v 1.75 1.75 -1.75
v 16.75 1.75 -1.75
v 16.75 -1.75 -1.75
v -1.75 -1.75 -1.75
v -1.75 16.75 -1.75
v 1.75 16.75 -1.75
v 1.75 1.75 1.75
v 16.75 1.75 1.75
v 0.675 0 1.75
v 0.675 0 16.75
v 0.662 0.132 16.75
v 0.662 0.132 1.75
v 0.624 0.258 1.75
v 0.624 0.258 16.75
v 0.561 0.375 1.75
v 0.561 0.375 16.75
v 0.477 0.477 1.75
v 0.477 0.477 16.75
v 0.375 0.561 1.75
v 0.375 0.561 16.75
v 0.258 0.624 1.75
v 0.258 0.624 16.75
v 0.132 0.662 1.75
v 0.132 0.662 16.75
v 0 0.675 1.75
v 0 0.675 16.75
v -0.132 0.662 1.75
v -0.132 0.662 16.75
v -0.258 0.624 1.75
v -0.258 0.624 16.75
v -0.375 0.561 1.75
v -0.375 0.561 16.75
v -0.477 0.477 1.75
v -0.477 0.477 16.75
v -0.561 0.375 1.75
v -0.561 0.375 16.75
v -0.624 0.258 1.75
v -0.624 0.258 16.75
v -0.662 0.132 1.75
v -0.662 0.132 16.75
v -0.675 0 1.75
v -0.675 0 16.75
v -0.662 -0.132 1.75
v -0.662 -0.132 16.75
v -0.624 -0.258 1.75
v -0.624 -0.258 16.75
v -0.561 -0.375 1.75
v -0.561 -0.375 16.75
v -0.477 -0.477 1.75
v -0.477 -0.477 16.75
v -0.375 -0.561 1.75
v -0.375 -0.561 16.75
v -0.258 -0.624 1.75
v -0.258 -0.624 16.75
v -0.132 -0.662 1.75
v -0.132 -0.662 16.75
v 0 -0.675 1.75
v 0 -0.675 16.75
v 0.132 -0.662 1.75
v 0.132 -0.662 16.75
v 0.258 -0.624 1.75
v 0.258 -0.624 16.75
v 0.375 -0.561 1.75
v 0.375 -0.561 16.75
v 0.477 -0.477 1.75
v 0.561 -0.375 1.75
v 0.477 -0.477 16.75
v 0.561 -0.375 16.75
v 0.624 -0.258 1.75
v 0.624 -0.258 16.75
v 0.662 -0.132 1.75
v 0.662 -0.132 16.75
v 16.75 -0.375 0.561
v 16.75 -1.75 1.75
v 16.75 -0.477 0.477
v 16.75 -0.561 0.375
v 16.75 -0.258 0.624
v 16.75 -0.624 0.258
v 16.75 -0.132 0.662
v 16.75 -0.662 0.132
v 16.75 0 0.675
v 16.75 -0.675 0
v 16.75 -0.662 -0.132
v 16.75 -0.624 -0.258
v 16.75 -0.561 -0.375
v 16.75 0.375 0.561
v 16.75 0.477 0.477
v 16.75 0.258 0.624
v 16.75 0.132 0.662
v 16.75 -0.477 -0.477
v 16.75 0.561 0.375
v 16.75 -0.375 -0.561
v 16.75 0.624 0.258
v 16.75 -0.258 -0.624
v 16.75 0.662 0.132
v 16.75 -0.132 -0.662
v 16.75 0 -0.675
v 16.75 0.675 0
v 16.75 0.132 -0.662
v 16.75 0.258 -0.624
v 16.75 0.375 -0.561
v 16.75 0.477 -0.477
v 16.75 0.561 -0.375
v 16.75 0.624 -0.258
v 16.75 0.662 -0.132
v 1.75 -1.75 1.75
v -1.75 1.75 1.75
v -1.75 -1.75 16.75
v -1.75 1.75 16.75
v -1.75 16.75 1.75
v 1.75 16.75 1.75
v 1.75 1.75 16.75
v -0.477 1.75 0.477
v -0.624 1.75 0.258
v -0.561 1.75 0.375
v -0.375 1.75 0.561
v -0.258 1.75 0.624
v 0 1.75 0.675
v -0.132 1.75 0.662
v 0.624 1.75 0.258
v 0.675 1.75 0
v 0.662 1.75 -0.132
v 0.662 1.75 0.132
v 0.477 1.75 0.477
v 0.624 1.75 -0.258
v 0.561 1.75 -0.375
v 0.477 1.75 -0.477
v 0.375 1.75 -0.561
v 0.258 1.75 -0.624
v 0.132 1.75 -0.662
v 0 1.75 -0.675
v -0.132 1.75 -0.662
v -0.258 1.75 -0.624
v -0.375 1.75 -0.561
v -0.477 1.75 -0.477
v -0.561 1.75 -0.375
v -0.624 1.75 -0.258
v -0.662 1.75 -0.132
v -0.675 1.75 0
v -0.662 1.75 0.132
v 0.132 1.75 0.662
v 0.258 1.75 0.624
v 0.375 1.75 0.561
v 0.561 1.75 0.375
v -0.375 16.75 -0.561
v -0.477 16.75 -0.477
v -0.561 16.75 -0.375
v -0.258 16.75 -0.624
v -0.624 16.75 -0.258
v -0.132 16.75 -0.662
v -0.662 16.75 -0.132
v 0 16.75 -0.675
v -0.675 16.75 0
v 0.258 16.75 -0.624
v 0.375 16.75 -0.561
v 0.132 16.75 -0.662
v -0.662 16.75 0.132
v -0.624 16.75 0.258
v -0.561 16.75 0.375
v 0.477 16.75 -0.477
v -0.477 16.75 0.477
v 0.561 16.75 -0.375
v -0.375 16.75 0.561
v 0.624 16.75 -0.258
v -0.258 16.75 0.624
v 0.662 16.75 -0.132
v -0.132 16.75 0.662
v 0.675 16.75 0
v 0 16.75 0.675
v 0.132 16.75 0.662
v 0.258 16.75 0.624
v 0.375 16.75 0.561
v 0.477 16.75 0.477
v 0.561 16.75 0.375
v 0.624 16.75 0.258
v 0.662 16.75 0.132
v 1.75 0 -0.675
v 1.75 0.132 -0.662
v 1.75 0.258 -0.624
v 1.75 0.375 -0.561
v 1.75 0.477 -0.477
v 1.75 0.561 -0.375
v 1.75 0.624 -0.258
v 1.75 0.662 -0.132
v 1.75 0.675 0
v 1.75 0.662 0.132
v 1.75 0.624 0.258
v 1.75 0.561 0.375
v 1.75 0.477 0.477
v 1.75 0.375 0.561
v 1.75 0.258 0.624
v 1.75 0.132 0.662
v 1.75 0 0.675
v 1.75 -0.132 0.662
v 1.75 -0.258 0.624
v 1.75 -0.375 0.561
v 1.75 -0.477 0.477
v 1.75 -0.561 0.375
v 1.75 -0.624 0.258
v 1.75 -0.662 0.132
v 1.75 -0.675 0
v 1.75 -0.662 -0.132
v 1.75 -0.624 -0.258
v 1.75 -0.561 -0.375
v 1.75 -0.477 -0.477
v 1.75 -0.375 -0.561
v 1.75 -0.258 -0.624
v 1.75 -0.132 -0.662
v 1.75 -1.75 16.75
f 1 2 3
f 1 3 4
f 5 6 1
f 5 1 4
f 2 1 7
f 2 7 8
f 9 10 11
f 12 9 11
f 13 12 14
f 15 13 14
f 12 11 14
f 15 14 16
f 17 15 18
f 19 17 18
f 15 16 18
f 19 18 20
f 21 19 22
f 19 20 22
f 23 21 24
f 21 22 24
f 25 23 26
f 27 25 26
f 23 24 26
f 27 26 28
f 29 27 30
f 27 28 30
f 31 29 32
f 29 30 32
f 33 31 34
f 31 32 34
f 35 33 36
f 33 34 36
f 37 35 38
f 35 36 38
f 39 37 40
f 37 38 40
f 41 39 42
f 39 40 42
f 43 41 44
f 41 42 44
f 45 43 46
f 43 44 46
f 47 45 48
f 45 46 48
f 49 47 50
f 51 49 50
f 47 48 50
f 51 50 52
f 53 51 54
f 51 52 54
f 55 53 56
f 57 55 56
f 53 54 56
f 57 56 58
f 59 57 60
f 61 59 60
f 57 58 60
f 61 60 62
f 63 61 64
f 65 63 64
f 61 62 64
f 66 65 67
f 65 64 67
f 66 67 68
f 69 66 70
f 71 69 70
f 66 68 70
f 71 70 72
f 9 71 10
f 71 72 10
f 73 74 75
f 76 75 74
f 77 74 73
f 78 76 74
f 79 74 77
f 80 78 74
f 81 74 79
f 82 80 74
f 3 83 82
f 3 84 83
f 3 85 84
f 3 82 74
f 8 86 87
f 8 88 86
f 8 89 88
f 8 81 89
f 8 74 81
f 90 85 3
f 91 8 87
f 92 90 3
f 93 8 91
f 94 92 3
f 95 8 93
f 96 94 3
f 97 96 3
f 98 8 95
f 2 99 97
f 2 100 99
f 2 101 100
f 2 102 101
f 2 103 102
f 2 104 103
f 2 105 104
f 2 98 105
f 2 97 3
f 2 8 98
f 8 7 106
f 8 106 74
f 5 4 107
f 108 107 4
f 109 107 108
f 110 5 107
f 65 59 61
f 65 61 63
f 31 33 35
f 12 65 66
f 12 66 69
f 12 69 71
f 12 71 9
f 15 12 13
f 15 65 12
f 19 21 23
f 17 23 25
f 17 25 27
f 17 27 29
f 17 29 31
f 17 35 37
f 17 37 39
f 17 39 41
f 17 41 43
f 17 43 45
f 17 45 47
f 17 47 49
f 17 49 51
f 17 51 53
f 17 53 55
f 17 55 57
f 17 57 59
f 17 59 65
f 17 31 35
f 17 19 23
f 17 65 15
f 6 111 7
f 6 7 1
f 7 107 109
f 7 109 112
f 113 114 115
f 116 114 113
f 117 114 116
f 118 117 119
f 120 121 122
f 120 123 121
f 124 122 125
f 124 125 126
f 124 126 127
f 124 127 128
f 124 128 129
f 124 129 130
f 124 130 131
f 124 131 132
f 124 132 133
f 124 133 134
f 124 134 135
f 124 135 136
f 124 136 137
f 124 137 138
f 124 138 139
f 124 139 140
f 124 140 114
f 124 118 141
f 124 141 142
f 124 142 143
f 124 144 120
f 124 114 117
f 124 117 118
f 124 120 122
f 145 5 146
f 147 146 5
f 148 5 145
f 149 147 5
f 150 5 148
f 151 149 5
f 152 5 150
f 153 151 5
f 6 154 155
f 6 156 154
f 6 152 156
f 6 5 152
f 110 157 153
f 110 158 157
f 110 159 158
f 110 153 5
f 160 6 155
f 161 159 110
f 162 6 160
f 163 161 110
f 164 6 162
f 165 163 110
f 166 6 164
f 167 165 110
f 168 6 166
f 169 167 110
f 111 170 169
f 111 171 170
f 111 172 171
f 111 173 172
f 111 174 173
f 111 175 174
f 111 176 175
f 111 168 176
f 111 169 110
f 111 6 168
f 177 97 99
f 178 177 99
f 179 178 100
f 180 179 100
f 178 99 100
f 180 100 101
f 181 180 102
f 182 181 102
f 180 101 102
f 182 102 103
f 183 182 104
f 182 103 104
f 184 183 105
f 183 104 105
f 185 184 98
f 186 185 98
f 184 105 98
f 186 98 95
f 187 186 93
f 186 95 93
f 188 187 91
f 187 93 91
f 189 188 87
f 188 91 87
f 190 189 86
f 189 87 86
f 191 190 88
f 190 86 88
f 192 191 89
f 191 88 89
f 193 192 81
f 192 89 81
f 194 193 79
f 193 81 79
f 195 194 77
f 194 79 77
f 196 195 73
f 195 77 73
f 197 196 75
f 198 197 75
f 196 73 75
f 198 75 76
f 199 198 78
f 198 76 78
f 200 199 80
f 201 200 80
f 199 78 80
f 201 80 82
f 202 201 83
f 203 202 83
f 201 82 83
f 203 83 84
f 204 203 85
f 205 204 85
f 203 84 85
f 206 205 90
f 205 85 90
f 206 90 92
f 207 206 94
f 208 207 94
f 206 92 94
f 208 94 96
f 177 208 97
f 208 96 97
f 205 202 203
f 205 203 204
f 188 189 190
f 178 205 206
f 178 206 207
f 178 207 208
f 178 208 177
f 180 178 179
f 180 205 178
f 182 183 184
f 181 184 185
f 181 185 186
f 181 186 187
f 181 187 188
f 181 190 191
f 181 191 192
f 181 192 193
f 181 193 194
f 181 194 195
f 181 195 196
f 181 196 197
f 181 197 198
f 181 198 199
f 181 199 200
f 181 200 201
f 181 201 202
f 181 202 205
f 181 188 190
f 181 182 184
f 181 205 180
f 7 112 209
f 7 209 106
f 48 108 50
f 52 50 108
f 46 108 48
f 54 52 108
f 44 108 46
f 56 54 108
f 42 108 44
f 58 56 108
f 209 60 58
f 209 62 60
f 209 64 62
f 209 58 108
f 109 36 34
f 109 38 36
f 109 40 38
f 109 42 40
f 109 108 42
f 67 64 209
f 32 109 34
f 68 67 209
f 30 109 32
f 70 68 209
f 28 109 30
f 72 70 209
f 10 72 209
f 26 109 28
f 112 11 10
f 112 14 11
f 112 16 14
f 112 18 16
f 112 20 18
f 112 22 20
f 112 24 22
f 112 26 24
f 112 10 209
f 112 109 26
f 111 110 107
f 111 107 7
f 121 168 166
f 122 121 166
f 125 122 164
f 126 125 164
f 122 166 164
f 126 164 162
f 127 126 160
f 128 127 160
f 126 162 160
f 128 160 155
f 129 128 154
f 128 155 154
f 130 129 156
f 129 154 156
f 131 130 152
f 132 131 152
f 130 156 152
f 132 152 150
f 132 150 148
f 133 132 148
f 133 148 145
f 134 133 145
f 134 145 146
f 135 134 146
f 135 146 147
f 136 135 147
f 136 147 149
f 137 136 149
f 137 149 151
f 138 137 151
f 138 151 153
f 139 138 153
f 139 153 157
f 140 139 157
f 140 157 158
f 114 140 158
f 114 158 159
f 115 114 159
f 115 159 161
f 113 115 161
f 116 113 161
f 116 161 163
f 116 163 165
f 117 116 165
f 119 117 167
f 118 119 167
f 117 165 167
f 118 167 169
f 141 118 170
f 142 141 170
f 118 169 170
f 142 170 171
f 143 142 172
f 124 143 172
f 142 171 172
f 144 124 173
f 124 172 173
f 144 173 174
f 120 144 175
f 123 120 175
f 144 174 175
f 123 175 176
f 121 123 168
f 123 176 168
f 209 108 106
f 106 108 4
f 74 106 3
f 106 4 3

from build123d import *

# Parameters (mm, degrees)
BOSS_EXTRUDE1_DEPTH  = 1.75
SKETCH3_R            = 0.675
CUT_EXTRUDE1_DEPTH   = 15
SKETCH4_R            = 0.675
CUT_EXTRUDE2_DEPTH   = 15
SKETCH5_W            = 3.5
SKETCH5_H            = 3.5
CUT_SWEEP1_PROFILE_R = 0.675


with BuildPart() as part:
    # Sketch2 → Boss-Extrude1 (new, symmetric)
    with BuildSketch(Plane(origin=(0, 0, 0), x_dir=(1, 0, 0), z_dir=(0, 1, 0))):
        Polygon((-1.75, 1.75), (-1.75, -16.75), (1.75, -16.75), (1.75, -1.75), (16.75, -1.75), (16.75, 1.75), align=None)
    extrude(amount=BOSS_EXTRUDE1_DEPTH, both=True)

    # Sketch3 → Cut-Extrude1 (cut)
    with BuildSketch(Plane.XY.offset(16.75)):
        Circle(SKETCH3_R)
    extrude(amount=-CUT_EXTRUDE1_DEPTH, mode=Mode.SUBTRACT)

    # Sketch4 → Cut-Extrude2 (cut)
    with BuildSketch(Plane(origin=(16.75, 0, 0), x_dir=(0, 0, -1), z_dir=(1, 0, 0))):
        Circle(SKETCH4_R)
    extrude(amount=-CUT_EXTRUDE2_DEPTH, mode=Mode.SUBTRACT)

    # Sweep1: sweep along a path in Sketch7
    with BuildLine(Plane(origin=(0, 0, 0), x_dir=(0.7071067811865477, 0, 0.7071067811865475), z_dir=(-0.7071067811865475, 0, 0.7071067811865477))) as sweep1_path:
        Line((0, 1.75), (0, 16.75))
    # Sketch5 → Sweep1 (sweep)
    with BuildSketch(Plane(origin=(0, 1.75, 0), x_dir=(1, 0, 0), z_dir=(0, 1, 0))):
        Rectangle(SKETCH5_W, SKETCH5_H)
    sweep(path=sweep1_path.line)

    # Cut-Sweep1: sweep along a path in Sketch7<2>
    with BuildLine(Plane(origin=(0, 0, 0), x_dir=(0.7071067811865477, 0, 0.7071067811865475), z_dir=(-0.7071067811865475, 0, 0.7071067811865477))) as cut_sweep1_path:
        Line((0, 1.75), (0, 16.75))
    # Cut-Sweep1 profile (on start of the path) → Cut-Sweep1 (sweep, cut)
    with BuildSketch(Plane(origin=(0, 1.75, 0), x_dir=(1, 0, 0), z_dir=(0, 1, 0))):
        Circle(CUT_SWEEP1_PROFILE_R)
    sweep(path=cut_sweep1_path.line, mode=Mode.SUBTRACT)


solid = part.part
